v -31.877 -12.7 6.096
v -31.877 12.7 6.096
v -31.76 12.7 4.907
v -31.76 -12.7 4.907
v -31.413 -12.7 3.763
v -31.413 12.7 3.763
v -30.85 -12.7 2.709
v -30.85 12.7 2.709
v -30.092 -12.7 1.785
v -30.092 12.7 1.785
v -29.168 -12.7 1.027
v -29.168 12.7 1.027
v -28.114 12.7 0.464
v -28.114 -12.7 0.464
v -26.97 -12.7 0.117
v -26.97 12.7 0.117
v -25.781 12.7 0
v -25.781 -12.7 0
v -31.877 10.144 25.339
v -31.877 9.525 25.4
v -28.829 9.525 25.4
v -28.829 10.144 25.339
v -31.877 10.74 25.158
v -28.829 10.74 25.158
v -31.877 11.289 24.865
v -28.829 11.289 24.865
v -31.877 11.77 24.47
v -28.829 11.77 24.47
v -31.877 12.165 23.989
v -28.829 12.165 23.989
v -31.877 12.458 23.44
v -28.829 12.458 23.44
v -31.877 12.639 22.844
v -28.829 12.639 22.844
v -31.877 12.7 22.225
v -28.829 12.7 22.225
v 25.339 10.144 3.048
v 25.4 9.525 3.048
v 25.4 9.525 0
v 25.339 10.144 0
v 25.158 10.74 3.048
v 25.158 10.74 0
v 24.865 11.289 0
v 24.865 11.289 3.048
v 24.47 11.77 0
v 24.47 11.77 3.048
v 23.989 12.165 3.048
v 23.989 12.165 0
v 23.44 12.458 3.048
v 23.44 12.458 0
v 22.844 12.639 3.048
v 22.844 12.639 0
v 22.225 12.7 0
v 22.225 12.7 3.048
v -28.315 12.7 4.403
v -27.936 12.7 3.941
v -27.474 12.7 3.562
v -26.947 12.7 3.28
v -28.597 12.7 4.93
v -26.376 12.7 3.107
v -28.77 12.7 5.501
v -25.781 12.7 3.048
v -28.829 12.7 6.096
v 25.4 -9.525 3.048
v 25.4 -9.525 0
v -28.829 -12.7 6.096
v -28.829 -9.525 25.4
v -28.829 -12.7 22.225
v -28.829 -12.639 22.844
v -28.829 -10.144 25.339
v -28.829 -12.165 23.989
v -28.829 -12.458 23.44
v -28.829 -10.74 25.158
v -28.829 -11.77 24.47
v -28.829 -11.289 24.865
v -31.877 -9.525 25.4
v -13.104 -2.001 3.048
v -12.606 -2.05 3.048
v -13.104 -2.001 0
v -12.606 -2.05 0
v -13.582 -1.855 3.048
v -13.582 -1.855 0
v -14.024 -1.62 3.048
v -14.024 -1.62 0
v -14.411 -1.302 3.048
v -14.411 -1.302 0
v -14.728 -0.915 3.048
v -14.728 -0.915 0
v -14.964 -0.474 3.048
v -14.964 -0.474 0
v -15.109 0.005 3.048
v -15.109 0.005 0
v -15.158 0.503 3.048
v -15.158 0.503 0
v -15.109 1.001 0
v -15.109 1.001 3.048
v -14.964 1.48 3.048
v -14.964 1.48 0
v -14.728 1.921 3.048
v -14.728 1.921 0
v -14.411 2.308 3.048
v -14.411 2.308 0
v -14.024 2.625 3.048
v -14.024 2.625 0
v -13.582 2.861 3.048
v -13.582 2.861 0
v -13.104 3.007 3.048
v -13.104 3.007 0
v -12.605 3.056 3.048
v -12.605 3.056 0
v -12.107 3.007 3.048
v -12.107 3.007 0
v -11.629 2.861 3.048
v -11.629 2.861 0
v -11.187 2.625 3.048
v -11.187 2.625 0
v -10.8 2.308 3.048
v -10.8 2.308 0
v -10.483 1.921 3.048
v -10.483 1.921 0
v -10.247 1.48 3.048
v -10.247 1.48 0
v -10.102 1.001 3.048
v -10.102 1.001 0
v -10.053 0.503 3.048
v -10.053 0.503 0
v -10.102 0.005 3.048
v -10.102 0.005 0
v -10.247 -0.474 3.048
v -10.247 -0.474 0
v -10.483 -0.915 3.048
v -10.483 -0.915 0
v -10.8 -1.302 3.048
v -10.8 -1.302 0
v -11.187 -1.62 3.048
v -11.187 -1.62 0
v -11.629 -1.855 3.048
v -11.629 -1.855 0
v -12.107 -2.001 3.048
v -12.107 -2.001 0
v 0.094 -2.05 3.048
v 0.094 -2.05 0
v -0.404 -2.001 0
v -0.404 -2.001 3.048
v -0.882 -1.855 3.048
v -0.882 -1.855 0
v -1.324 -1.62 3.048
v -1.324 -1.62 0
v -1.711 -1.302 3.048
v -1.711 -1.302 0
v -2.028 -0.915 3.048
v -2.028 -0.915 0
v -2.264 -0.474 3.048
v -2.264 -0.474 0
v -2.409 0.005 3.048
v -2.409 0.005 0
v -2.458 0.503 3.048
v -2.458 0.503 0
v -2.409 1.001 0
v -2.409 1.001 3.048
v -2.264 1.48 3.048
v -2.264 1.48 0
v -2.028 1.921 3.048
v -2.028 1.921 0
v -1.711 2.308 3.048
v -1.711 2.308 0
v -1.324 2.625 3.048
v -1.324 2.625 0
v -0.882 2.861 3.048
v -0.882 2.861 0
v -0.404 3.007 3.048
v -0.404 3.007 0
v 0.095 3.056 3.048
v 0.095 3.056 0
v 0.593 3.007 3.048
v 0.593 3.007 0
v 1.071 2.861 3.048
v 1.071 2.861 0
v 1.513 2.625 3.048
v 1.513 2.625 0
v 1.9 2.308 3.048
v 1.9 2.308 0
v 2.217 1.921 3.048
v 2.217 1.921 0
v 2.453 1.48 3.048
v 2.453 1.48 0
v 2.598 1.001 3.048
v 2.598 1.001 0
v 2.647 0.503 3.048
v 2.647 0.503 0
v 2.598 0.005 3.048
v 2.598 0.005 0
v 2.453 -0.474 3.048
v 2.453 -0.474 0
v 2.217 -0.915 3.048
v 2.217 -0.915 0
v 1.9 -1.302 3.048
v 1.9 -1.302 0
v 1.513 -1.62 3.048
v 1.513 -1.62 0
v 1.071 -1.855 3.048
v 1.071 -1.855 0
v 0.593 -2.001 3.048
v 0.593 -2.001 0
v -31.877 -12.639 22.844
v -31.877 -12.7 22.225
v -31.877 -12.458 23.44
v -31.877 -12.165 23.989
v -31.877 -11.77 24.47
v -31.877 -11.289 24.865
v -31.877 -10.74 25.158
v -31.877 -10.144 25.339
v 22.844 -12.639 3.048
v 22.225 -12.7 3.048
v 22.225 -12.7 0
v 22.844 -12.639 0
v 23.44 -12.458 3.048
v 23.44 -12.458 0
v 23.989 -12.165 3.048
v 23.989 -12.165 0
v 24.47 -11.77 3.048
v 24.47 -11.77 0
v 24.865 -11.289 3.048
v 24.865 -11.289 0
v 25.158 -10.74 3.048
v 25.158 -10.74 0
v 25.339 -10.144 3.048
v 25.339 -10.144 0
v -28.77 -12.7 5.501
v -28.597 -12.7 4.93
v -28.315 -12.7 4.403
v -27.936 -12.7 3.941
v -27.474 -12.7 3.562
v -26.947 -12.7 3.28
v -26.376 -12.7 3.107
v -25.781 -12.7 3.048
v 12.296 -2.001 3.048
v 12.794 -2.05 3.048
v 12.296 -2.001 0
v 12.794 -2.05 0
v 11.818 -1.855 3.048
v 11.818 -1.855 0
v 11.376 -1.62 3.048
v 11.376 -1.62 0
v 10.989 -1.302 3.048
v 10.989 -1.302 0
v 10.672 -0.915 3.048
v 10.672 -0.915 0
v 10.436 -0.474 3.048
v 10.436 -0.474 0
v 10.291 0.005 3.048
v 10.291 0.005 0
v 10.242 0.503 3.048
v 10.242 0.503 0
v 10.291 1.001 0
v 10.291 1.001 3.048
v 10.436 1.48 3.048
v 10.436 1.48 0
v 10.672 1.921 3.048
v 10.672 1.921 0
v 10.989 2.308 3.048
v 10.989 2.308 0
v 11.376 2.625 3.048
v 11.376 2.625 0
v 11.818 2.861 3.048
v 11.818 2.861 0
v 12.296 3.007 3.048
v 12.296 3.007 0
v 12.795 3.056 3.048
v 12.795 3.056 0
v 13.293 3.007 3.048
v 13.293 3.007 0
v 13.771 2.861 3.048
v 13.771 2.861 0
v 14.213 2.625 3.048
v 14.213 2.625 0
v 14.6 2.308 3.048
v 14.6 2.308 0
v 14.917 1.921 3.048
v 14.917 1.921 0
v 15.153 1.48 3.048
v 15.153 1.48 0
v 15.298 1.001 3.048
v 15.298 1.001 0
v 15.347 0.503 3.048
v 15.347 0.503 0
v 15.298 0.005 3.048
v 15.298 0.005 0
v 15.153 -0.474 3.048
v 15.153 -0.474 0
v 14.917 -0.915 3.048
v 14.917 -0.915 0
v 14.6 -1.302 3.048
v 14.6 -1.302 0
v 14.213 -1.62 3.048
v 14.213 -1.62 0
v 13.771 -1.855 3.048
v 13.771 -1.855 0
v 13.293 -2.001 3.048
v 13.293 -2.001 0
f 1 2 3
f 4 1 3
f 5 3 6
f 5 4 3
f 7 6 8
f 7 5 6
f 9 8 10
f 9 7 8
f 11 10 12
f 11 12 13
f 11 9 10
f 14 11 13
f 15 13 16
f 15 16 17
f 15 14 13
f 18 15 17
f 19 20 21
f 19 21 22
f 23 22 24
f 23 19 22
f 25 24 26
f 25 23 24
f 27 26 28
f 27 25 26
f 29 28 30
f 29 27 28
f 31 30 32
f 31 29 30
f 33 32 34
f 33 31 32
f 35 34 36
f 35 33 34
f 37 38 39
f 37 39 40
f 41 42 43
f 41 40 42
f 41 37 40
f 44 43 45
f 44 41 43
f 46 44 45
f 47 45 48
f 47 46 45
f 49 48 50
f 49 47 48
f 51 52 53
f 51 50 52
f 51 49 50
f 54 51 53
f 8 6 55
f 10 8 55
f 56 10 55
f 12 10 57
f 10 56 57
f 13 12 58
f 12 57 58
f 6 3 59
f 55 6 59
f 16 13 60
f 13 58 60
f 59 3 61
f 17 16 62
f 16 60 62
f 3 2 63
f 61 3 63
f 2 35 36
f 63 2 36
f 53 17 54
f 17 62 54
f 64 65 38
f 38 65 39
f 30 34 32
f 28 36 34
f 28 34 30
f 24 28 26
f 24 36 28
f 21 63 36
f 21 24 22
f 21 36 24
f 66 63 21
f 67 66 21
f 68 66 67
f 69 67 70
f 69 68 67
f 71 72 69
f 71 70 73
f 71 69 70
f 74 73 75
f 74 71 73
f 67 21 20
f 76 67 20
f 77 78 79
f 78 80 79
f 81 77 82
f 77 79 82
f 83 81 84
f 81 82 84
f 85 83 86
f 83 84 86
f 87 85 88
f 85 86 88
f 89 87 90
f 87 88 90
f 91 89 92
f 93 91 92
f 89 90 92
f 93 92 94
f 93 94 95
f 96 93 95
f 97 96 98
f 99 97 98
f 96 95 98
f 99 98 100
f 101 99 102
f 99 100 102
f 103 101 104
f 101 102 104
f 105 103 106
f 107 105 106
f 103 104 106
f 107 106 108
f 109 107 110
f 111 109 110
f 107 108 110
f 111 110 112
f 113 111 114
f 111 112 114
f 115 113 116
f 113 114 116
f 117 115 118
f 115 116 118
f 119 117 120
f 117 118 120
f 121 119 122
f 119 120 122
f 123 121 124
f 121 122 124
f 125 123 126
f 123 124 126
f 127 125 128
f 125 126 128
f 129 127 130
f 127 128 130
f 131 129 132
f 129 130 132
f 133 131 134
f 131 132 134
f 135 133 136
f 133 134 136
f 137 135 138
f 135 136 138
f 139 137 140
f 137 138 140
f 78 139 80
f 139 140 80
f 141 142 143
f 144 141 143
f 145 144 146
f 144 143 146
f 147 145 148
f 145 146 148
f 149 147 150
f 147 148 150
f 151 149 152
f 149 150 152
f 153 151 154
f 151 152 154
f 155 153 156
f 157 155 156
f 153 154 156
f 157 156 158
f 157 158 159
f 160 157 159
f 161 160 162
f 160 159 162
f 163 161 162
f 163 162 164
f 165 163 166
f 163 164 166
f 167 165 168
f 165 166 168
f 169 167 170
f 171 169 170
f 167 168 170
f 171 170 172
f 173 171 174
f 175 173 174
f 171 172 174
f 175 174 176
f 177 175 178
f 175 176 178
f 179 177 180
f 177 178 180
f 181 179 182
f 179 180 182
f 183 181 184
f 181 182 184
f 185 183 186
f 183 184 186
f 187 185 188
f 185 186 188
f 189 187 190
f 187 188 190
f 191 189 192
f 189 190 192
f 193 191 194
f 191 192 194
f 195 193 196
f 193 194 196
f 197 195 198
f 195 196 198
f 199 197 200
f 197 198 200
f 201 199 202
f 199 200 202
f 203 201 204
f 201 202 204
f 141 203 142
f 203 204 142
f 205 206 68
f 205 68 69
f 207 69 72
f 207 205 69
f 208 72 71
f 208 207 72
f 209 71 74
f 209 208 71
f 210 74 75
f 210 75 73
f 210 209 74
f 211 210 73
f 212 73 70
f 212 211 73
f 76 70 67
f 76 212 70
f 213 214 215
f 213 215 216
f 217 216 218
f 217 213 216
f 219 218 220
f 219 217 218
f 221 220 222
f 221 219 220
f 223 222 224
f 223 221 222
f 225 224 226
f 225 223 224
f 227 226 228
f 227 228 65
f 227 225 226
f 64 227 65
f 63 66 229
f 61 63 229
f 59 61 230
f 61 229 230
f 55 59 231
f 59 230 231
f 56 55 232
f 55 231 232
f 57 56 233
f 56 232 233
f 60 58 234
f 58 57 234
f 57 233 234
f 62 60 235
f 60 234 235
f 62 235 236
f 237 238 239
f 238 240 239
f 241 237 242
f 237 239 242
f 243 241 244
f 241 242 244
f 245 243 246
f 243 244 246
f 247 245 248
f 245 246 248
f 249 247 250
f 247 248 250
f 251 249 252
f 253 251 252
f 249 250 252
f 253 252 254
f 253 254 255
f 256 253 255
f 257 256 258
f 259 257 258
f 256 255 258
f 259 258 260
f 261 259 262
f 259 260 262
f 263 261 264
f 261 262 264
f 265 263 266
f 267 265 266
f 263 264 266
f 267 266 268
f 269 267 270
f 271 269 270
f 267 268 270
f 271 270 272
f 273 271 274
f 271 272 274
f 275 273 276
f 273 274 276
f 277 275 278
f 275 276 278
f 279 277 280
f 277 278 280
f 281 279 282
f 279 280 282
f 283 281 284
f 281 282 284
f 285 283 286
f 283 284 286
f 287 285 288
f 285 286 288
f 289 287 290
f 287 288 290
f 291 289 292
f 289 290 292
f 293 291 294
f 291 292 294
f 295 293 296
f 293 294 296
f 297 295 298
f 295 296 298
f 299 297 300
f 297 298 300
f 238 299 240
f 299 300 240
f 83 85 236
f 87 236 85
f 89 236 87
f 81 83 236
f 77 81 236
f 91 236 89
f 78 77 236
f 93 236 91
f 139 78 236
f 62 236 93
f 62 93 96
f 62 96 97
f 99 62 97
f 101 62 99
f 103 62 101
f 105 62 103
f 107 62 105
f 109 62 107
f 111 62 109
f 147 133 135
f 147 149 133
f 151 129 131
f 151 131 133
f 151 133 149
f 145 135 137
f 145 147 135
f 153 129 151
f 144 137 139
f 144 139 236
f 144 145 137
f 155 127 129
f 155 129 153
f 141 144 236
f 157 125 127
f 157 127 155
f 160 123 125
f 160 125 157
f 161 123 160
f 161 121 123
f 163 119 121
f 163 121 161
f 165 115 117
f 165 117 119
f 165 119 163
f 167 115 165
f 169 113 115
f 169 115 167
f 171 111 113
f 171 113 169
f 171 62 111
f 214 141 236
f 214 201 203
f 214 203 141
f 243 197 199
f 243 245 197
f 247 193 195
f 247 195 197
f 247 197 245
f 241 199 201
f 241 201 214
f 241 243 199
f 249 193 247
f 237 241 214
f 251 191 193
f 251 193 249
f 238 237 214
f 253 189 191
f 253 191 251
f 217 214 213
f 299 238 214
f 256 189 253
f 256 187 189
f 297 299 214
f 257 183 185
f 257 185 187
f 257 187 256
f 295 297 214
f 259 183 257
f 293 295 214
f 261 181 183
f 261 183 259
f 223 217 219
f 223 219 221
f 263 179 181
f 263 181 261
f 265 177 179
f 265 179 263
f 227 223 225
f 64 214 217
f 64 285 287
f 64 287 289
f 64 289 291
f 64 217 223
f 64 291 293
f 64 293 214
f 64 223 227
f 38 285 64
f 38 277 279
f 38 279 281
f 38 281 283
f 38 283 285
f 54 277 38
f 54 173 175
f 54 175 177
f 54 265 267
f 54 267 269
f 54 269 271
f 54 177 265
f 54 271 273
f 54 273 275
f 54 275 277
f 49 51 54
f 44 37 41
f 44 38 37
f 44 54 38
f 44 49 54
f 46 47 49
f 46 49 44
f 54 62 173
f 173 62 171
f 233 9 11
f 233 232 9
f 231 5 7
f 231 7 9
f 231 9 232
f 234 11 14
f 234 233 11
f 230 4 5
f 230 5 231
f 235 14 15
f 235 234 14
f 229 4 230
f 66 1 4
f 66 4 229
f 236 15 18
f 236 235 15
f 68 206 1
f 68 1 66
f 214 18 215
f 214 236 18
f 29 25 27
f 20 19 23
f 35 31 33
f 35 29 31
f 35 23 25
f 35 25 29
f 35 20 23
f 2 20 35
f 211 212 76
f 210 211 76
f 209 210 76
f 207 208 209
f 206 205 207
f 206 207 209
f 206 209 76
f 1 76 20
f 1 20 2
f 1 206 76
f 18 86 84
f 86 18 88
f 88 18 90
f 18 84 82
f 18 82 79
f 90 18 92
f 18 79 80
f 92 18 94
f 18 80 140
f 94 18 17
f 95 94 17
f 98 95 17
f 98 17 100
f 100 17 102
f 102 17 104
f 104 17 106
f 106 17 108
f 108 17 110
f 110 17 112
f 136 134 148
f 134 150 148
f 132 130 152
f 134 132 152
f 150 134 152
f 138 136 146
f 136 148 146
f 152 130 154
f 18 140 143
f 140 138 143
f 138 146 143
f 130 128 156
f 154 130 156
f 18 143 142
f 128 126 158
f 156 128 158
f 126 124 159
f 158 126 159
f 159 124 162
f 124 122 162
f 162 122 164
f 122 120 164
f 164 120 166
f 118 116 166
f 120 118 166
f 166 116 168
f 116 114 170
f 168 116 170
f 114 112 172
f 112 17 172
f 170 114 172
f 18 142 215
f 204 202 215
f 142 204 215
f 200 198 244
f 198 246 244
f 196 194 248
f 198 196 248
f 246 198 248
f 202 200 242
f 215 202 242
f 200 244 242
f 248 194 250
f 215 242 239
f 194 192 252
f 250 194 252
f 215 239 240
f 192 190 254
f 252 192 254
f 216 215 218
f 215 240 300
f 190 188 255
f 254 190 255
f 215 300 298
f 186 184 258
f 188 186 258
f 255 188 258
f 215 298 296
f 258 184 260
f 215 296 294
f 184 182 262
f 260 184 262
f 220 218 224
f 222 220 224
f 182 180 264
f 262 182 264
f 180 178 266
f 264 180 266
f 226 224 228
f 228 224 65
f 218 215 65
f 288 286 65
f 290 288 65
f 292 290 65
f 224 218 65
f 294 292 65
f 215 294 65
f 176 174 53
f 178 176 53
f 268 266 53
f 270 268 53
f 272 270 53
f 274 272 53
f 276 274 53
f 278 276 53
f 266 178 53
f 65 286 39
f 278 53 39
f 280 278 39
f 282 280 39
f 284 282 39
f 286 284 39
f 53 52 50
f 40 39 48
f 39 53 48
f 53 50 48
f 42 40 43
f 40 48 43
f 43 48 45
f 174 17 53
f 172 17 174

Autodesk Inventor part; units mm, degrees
ref_plane "YZ Plane" through (0, 0, 0) normal (1, 0, 0) x (0, 1, 0)
ref_plane "XZ Plane" through (0, 0, 0) normal (0, 1, 0) x (-1, 0, 0)
ref_plane "XY Plane" through (0, 0, 0) normal (0, 0, 1) x (1, 0, 0)
sketch "Sketch1" plane through (0, 0, 0) normal (0, 0, 1) x (1, 0, 0)
  line L0 (25.4, 12.7) -> (-25.4, 12.7)
  line L1 (-25.4, 12.7) -> (-25.4, -12.7) construction
  line L2 (-25.4, -12.7) -> (25.4, -12.7)
  line L3 (25.4, -12.7) -> (25.4, 12.7)
  line L4 (25.4, 12.7) -> (-25.4, -12.7) construction
  line L5 (-25.4, 12.7) -> (25.4, -12.7) construction
  line L6 (-25.4, -12.7) -> (-28.829, -12.7)
  line L7 (-28.829, -12.7) -> (-28.829, 12.7)
  line L8 (-28.829, 12.7) -> (-25.4, 12.7)
  point P0 (0, 0)
  dimension "d0" = 25.4
  dimension "d1" = 50.8
  dimension "d2" = 3.429
extrude "Plate1" add sketch "Sketch1" along normal blind 3.048
sketch "Sketch2" plane through (-28.829, -12.7, 3.048) normal (-1, 0, 0) x (0, -1, 0)
  line L0 (-25.4, 0) -> (0, 0)
  line L1 (0, 0) -> (0, 22.352)
  line L2 (0, 22.352) -> (-25.4, 22.352)
  line L3 (-25.4, 22.352) -> (-25.4, 0)
edge flange "Flange1" height 25.4 angle 90 thickness 3.048 bend radius 3.048 thickness toward (-1, 0, 0) relief tear relief width 3.048 relief depth 1.524 edges at (-28.829, 0, 3.048) wall of the first edge with corners at (-28.829, 12.7, 3.048) (-28.829, -12.7, 3.048) (-28.829, -12.7, 25.4) (-28.829, 12.7, 25.4)
bend "Bend1"
corner "Corner1"
sketch "Sketch3" plane through (0, 0, 3.048) normal (0, 0, 1) x (1, 0, 0)
  point P0 (0, 0)
  point P1 (0.0945, 0.5029)
hole "Hole1" at (0.0945, 0.5029, 3.048) direction (0, 0, -1) diameter 5.1054 end through all clearance for "Flat Head Machine Screw (82)" size "#10" standard "Ansi Unified Screw Threads"
pattern_linear "Rectangular Pattern1" count 3 spacing 12.7 along (1, 0, 0) of "Hole1" first direction both ways yes
fillet "Corner Round1" radius 3.175 4 edges at (25.4, -12.7, 1.524) (25.4, 12.7, 1.524) (-30.353, 12.7, 25.4) (-30.353, -12.7, 25.4)
equation "\"d19\" = Thickness"
equation "\"d3\" = Thickness"
equation "\"d4\" = BendReliefWidth"
equation "\"d5\" = BendReliefDepth"
equation "\"d6\" = MinimumRemnant"
equation "\"d7\" = TransitionRadius"
equation "\"d10\" = BendRadius"
equation "\"d11\" = CornerReliefSize"
equation "\"d12\" = GapSize"
equation "\"d13\" = JacobiRadiusSize"
equation "\"BendRadius\" = Thickness"
equation "\"BendReliefWidth\" = Thickness"
equation "\"BendReliefDepth\" = 0.5 * Thickness"
equation "\"CornerReliefSize\" = 4 * Thickness"
equation "\"MinimumRemnant\" = 2 * Thickness"
equation "\"TransitionRadius\" = BendRadius"
equation "\"JacobiRadiusSize\" = BendRadius"
equation "\"GapSize\" = Thickness"
equation "\"Thickness\" = 3.048"
properties part number "MOUNT,FLANGE,BELLYPAN" material "Steel, Alloy"
